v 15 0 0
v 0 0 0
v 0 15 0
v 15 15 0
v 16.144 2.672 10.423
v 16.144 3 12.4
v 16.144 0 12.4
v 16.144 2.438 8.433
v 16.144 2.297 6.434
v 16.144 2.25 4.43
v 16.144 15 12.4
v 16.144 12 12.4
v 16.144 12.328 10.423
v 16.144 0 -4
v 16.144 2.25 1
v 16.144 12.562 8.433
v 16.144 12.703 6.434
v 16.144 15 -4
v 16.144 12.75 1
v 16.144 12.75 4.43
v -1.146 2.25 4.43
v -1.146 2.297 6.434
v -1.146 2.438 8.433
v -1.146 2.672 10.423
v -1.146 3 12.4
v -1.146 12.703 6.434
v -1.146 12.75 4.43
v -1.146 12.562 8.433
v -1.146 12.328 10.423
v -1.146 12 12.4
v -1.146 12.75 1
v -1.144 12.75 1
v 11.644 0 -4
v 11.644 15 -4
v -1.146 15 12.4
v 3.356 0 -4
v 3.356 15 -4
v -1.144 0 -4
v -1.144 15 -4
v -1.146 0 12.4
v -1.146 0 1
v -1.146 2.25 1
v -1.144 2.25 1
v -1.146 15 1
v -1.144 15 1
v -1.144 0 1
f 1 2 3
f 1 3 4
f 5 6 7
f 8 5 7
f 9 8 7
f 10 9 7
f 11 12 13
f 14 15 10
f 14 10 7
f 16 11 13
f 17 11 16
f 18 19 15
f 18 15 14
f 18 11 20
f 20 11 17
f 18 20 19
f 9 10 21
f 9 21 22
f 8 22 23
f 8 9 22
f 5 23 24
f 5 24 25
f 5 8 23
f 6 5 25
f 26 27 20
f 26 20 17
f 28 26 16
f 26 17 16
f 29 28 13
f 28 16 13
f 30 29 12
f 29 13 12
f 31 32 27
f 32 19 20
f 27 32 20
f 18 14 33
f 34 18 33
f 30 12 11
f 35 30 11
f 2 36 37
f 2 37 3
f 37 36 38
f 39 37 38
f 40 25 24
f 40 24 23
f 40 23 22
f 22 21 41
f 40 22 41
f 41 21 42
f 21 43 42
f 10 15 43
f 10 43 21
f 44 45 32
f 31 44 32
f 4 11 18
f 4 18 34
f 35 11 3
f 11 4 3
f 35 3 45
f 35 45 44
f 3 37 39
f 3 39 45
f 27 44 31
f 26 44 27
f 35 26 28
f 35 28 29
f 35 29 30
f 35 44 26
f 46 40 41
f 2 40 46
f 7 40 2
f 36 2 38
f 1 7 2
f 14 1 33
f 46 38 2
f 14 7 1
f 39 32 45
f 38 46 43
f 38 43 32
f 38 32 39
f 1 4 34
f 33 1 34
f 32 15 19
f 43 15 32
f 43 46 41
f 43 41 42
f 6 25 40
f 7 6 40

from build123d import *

# Parameters (mm, degrees)
BOSS_EXTRUDE1_DEPTH = 15
BOSS_EXTRUDE2_DEPTH = 17.29


with BuildPart() as part:
    # Sketch2 → Boss-Extrude1 (new body)
    with BuildSketch(Plane(origin=(0, 0, 0), x_dir=(1, 0, 0), z_dir=(0, 1, 0))):
        Polygon((0, 0), (15, 0), (11.643601475, 4), (13.143601475, 4), (16.143601475, 4), (16.143601475, -1), (-1.143601475, -1), (-1.143601475, 4), (1.856398525, 4), (3.356398525, 4), align=None)
    extrude(amount=BOSS_EXTRUDE1_DEPTH)

    # Sketch5 → Boss-Extrude2 (add)
    with BuildSketch(Plane(origin=(16.143601475, 0, 0), x_dir=(0, 0, -1), z_dir=(1, 0, 0))):
        with BuildLine():
            Line((-1, 2.25), (-4.43, 2.25))
            ThreePointArc((-4.43, 2.25), (-8.432605401, 2.437913267), (-12.4, 3))
            Line((-12.4, 3), (-12.4, 0))
            Line((-12.4, 0), (-1, 0))
            Line((-1, 0), (-1, 2.25))
        make_face()
        with BuildLine():
            Line((-1, 12.75), (-4.43, 12.75))
            ThreePointArc((-4.43, 12.75), (-8.432605401, 12.562086733), (-12.4, 12))
            Line((-12.4, 12), (-12.4, 15))
            Line((-12.4, 15), (-1, 15))
            Line((-1, 15), (-1, 12.75))
        make_face()
    extrude(amount=-BOSS_EXTRUDE2_DEPTH)


solid = part.part
